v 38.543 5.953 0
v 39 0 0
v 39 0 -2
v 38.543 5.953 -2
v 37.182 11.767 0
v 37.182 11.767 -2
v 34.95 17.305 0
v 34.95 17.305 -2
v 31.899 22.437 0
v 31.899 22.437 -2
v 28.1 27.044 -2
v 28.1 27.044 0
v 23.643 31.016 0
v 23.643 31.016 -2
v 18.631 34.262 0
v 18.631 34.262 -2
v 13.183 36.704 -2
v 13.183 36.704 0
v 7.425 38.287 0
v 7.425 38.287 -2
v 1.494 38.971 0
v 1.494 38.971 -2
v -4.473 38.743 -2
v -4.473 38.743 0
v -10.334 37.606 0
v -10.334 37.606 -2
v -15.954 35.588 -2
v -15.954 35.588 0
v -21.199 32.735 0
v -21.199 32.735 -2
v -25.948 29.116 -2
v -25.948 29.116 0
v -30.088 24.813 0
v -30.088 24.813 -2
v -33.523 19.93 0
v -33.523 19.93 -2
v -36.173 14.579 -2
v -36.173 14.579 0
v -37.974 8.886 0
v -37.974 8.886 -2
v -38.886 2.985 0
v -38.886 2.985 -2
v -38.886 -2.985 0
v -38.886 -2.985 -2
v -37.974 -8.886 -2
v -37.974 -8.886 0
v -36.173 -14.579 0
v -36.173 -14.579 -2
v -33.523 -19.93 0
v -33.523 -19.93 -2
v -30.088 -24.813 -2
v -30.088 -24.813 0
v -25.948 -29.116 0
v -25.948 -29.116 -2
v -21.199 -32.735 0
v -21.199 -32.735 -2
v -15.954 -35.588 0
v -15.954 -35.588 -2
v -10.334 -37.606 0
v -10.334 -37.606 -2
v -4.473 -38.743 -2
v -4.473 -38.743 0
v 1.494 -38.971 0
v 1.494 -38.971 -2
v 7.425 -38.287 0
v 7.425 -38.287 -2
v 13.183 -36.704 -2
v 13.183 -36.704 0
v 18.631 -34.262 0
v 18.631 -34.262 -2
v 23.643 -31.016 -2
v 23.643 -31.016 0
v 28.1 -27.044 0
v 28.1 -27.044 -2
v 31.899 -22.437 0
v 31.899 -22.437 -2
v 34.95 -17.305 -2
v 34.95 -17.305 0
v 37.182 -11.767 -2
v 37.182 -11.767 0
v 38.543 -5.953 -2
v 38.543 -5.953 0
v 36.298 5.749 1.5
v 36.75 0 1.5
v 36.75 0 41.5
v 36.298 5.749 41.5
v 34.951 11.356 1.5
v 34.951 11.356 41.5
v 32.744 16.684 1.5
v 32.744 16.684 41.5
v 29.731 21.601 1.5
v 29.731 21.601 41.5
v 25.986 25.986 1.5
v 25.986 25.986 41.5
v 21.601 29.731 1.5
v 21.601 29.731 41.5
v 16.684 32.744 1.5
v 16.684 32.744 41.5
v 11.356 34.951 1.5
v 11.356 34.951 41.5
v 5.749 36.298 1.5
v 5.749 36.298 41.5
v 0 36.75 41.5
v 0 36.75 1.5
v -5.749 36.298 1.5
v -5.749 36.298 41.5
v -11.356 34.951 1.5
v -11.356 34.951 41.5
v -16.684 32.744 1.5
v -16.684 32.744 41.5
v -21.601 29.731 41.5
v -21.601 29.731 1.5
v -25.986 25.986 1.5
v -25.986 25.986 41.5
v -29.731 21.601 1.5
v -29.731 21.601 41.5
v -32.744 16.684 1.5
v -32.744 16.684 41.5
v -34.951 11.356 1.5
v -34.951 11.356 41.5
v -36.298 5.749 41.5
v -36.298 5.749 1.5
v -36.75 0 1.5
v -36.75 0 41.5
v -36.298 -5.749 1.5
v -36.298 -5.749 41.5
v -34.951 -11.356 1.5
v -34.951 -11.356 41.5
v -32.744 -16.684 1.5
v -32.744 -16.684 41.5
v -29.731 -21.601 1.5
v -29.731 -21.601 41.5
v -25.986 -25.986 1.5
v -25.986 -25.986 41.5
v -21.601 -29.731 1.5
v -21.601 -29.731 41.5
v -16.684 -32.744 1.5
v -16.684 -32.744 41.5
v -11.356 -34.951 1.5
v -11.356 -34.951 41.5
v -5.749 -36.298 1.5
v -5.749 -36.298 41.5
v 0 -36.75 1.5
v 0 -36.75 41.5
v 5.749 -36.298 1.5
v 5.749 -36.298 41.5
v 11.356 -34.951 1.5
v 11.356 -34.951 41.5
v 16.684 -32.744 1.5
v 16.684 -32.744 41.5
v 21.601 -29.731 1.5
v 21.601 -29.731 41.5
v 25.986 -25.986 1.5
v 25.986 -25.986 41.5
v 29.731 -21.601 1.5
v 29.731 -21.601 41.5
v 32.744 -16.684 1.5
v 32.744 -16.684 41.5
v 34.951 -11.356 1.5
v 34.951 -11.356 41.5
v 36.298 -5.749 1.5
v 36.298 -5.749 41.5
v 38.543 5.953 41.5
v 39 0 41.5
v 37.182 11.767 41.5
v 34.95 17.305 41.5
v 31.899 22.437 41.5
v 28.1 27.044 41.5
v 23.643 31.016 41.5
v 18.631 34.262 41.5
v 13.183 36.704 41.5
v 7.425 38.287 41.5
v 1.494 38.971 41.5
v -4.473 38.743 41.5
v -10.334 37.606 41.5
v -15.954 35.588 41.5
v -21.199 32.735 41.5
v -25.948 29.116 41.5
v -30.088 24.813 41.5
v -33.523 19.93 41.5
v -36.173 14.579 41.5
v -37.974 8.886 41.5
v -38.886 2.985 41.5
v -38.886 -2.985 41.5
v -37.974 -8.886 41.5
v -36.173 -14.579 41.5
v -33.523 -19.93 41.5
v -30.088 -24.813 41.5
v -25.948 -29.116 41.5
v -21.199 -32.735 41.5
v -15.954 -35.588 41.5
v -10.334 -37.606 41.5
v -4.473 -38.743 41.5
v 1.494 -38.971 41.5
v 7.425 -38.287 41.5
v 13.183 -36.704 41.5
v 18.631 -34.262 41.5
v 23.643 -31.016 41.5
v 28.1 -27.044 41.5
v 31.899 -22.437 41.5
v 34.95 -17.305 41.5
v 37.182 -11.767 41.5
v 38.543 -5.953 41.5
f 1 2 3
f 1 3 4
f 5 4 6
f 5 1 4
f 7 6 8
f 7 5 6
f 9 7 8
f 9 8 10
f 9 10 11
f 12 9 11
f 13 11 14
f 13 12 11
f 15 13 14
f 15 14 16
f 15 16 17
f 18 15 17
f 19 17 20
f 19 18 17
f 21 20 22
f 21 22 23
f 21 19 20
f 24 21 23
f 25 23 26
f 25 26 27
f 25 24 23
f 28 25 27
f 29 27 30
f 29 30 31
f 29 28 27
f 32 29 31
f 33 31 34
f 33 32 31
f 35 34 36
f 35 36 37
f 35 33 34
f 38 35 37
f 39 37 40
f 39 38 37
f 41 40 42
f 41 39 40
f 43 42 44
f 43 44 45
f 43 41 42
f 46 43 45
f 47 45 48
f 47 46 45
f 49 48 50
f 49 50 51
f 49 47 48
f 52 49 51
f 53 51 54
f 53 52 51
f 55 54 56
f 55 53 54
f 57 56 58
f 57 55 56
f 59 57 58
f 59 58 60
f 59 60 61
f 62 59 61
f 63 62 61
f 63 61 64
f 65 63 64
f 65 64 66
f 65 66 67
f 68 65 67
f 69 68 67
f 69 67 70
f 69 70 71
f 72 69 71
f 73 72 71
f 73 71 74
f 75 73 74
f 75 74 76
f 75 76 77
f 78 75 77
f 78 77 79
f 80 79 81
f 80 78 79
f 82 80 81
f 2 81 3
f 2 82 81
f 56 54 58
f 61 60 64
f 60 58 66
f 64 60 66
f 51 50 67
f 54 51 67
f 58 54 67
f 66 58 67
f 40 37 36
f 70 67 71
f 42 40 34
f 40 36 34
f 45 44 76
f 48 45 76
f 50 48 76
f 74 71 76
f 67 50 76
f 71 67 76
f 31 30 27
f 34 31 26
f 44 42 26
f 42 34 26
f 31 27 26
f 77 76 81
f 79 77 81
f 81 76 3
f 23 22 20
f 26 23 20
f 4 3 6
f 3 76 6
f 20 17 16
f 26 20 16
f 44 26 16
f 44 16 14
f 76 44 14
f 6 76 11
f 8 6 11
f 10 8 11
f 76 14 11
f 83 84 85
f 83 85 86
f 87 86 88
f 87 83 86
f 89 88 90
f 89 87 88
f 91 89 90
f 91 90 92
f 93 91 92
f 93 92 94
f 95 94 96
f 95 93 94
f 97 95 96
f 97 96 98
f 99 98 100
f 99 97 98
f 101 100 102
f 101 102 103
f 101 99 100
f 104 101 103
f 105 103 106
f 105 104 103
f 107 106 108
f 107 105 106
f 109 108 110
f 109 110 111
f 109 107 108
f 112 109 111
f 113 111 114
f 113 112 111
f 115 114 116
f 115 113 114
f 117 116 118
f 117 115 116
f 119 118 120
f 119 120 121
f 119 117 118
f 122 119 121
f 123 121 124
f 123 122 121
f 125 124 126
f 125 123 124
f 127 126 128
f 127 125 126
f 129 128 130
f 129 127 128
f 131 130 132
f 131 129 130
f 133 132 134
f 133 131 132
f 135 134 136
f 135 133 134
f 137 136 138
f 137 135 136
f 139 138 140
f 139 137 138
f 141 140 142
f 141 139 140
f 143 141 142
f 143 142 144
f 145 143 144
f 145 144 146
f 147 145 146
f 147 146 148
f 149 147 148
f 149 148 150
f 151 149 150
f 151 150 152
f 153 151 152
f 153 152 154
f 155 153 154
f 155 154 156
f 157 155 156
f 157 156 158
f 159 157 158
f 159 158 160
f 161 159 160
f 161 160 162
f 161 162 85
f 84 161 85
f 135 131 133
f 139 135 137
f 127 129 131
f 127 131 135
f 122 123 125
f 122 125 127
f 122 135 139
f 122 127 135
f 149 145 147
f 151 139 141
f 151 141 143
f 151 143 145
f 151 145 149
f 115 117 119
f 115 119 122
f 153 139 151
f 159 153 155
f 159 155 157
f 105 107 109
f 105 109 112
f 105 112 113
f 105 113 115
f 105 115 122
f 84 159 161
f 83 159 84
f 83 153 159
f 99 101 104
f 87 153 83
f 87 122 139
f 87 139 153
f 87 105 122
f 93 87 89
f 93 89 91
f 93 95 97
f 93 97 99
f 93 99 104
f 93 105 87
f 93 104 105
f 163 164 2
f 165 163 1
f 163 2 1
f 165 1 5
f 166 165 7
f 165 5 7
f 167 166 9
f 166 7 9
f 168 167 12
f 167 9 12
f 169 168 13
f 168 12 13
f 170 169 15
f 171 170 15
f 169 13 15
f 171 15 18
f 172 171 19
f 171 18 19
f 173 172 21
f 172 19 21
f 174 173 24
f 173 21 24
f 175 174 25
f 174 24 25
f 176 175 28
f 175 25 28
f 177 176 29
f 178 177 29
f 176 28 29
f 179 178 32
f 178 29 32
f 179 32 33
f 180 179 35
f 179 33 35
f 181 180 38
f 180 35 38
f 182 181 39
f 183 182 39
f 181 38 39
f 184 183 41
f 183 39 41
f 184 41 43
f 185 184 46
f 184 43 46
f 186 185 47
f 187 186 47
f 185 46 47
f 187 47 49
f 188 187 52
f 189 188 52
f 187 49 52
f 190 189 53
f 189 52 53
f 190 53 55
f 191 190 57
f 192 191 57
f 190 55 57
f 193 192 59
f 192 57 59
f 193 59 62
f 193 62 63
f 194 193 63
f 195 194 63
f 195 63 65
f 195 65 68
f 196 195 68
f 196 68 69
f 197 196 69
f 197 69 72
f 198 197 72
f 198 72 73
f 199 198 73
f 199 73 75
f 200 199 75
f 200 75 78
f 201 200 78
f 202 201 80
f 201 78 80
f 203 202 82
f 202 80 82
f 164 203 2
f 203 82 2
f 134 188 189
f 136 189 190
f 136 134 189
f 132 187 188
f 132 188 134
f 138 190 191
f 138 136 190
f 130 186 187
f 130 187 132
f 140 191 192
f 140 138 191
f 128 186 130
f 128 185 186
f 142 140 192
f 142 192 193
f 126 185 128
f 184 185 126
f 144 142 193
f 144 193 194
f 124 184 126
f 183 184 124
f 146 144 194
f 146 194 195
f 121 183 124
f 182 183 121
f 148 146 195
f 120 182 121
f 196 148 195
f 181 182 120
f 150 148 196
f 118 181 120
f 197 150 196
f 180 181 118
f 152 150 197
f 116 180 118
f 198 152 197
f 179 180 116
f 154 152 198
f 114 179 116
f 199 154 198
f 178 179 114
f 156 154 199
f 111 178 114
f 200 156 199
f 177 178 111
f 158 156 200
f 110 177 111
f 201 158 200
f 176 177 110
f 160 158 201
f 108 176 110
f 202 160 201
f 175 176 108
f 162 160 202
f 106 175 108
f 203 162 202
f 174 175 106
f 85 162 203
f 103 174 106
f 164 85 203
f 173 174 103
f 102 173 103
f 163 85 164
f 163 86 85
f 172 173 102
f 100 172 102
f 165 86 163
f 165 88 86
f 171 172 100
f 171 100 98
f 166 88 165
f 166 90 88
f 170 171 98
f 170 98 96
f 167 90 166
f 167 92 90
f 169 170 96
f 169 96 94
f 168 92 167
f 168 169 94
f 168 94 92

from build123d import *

# Parameters (mm, degrees)
F0_R     = 39
F1_DEPTH = 1.5
F2_R     = 39
F2_R_2   = 36.75
F3_DEPTH = 40
F4_DEPTH = 2


with BuildPart() as f1:
    # F0 (on Top) → F1 (new body)
    with BuildSketch(Plane.XY):
        Circle(F0_R)
    extrude(amount=F1_DEPTH)

    # F2 (on face) → F3 (join)
    with BuildSketch(Plane.XY.offset(1.5)):
        Circle(F2_R)
        Circle(F2_R_2, mode=Mode.SUBTRACT)
    extrude(amount=F3_DEPTH)

    # F4 (add): a face of the model
    f4_faces = [f1.faces().sort_by_distance(p)[0] for p in [
        (0, 0, 0),
    ]]
    extrude(f4_faces, amount=F4_DEPTH)


solid = f1.part
